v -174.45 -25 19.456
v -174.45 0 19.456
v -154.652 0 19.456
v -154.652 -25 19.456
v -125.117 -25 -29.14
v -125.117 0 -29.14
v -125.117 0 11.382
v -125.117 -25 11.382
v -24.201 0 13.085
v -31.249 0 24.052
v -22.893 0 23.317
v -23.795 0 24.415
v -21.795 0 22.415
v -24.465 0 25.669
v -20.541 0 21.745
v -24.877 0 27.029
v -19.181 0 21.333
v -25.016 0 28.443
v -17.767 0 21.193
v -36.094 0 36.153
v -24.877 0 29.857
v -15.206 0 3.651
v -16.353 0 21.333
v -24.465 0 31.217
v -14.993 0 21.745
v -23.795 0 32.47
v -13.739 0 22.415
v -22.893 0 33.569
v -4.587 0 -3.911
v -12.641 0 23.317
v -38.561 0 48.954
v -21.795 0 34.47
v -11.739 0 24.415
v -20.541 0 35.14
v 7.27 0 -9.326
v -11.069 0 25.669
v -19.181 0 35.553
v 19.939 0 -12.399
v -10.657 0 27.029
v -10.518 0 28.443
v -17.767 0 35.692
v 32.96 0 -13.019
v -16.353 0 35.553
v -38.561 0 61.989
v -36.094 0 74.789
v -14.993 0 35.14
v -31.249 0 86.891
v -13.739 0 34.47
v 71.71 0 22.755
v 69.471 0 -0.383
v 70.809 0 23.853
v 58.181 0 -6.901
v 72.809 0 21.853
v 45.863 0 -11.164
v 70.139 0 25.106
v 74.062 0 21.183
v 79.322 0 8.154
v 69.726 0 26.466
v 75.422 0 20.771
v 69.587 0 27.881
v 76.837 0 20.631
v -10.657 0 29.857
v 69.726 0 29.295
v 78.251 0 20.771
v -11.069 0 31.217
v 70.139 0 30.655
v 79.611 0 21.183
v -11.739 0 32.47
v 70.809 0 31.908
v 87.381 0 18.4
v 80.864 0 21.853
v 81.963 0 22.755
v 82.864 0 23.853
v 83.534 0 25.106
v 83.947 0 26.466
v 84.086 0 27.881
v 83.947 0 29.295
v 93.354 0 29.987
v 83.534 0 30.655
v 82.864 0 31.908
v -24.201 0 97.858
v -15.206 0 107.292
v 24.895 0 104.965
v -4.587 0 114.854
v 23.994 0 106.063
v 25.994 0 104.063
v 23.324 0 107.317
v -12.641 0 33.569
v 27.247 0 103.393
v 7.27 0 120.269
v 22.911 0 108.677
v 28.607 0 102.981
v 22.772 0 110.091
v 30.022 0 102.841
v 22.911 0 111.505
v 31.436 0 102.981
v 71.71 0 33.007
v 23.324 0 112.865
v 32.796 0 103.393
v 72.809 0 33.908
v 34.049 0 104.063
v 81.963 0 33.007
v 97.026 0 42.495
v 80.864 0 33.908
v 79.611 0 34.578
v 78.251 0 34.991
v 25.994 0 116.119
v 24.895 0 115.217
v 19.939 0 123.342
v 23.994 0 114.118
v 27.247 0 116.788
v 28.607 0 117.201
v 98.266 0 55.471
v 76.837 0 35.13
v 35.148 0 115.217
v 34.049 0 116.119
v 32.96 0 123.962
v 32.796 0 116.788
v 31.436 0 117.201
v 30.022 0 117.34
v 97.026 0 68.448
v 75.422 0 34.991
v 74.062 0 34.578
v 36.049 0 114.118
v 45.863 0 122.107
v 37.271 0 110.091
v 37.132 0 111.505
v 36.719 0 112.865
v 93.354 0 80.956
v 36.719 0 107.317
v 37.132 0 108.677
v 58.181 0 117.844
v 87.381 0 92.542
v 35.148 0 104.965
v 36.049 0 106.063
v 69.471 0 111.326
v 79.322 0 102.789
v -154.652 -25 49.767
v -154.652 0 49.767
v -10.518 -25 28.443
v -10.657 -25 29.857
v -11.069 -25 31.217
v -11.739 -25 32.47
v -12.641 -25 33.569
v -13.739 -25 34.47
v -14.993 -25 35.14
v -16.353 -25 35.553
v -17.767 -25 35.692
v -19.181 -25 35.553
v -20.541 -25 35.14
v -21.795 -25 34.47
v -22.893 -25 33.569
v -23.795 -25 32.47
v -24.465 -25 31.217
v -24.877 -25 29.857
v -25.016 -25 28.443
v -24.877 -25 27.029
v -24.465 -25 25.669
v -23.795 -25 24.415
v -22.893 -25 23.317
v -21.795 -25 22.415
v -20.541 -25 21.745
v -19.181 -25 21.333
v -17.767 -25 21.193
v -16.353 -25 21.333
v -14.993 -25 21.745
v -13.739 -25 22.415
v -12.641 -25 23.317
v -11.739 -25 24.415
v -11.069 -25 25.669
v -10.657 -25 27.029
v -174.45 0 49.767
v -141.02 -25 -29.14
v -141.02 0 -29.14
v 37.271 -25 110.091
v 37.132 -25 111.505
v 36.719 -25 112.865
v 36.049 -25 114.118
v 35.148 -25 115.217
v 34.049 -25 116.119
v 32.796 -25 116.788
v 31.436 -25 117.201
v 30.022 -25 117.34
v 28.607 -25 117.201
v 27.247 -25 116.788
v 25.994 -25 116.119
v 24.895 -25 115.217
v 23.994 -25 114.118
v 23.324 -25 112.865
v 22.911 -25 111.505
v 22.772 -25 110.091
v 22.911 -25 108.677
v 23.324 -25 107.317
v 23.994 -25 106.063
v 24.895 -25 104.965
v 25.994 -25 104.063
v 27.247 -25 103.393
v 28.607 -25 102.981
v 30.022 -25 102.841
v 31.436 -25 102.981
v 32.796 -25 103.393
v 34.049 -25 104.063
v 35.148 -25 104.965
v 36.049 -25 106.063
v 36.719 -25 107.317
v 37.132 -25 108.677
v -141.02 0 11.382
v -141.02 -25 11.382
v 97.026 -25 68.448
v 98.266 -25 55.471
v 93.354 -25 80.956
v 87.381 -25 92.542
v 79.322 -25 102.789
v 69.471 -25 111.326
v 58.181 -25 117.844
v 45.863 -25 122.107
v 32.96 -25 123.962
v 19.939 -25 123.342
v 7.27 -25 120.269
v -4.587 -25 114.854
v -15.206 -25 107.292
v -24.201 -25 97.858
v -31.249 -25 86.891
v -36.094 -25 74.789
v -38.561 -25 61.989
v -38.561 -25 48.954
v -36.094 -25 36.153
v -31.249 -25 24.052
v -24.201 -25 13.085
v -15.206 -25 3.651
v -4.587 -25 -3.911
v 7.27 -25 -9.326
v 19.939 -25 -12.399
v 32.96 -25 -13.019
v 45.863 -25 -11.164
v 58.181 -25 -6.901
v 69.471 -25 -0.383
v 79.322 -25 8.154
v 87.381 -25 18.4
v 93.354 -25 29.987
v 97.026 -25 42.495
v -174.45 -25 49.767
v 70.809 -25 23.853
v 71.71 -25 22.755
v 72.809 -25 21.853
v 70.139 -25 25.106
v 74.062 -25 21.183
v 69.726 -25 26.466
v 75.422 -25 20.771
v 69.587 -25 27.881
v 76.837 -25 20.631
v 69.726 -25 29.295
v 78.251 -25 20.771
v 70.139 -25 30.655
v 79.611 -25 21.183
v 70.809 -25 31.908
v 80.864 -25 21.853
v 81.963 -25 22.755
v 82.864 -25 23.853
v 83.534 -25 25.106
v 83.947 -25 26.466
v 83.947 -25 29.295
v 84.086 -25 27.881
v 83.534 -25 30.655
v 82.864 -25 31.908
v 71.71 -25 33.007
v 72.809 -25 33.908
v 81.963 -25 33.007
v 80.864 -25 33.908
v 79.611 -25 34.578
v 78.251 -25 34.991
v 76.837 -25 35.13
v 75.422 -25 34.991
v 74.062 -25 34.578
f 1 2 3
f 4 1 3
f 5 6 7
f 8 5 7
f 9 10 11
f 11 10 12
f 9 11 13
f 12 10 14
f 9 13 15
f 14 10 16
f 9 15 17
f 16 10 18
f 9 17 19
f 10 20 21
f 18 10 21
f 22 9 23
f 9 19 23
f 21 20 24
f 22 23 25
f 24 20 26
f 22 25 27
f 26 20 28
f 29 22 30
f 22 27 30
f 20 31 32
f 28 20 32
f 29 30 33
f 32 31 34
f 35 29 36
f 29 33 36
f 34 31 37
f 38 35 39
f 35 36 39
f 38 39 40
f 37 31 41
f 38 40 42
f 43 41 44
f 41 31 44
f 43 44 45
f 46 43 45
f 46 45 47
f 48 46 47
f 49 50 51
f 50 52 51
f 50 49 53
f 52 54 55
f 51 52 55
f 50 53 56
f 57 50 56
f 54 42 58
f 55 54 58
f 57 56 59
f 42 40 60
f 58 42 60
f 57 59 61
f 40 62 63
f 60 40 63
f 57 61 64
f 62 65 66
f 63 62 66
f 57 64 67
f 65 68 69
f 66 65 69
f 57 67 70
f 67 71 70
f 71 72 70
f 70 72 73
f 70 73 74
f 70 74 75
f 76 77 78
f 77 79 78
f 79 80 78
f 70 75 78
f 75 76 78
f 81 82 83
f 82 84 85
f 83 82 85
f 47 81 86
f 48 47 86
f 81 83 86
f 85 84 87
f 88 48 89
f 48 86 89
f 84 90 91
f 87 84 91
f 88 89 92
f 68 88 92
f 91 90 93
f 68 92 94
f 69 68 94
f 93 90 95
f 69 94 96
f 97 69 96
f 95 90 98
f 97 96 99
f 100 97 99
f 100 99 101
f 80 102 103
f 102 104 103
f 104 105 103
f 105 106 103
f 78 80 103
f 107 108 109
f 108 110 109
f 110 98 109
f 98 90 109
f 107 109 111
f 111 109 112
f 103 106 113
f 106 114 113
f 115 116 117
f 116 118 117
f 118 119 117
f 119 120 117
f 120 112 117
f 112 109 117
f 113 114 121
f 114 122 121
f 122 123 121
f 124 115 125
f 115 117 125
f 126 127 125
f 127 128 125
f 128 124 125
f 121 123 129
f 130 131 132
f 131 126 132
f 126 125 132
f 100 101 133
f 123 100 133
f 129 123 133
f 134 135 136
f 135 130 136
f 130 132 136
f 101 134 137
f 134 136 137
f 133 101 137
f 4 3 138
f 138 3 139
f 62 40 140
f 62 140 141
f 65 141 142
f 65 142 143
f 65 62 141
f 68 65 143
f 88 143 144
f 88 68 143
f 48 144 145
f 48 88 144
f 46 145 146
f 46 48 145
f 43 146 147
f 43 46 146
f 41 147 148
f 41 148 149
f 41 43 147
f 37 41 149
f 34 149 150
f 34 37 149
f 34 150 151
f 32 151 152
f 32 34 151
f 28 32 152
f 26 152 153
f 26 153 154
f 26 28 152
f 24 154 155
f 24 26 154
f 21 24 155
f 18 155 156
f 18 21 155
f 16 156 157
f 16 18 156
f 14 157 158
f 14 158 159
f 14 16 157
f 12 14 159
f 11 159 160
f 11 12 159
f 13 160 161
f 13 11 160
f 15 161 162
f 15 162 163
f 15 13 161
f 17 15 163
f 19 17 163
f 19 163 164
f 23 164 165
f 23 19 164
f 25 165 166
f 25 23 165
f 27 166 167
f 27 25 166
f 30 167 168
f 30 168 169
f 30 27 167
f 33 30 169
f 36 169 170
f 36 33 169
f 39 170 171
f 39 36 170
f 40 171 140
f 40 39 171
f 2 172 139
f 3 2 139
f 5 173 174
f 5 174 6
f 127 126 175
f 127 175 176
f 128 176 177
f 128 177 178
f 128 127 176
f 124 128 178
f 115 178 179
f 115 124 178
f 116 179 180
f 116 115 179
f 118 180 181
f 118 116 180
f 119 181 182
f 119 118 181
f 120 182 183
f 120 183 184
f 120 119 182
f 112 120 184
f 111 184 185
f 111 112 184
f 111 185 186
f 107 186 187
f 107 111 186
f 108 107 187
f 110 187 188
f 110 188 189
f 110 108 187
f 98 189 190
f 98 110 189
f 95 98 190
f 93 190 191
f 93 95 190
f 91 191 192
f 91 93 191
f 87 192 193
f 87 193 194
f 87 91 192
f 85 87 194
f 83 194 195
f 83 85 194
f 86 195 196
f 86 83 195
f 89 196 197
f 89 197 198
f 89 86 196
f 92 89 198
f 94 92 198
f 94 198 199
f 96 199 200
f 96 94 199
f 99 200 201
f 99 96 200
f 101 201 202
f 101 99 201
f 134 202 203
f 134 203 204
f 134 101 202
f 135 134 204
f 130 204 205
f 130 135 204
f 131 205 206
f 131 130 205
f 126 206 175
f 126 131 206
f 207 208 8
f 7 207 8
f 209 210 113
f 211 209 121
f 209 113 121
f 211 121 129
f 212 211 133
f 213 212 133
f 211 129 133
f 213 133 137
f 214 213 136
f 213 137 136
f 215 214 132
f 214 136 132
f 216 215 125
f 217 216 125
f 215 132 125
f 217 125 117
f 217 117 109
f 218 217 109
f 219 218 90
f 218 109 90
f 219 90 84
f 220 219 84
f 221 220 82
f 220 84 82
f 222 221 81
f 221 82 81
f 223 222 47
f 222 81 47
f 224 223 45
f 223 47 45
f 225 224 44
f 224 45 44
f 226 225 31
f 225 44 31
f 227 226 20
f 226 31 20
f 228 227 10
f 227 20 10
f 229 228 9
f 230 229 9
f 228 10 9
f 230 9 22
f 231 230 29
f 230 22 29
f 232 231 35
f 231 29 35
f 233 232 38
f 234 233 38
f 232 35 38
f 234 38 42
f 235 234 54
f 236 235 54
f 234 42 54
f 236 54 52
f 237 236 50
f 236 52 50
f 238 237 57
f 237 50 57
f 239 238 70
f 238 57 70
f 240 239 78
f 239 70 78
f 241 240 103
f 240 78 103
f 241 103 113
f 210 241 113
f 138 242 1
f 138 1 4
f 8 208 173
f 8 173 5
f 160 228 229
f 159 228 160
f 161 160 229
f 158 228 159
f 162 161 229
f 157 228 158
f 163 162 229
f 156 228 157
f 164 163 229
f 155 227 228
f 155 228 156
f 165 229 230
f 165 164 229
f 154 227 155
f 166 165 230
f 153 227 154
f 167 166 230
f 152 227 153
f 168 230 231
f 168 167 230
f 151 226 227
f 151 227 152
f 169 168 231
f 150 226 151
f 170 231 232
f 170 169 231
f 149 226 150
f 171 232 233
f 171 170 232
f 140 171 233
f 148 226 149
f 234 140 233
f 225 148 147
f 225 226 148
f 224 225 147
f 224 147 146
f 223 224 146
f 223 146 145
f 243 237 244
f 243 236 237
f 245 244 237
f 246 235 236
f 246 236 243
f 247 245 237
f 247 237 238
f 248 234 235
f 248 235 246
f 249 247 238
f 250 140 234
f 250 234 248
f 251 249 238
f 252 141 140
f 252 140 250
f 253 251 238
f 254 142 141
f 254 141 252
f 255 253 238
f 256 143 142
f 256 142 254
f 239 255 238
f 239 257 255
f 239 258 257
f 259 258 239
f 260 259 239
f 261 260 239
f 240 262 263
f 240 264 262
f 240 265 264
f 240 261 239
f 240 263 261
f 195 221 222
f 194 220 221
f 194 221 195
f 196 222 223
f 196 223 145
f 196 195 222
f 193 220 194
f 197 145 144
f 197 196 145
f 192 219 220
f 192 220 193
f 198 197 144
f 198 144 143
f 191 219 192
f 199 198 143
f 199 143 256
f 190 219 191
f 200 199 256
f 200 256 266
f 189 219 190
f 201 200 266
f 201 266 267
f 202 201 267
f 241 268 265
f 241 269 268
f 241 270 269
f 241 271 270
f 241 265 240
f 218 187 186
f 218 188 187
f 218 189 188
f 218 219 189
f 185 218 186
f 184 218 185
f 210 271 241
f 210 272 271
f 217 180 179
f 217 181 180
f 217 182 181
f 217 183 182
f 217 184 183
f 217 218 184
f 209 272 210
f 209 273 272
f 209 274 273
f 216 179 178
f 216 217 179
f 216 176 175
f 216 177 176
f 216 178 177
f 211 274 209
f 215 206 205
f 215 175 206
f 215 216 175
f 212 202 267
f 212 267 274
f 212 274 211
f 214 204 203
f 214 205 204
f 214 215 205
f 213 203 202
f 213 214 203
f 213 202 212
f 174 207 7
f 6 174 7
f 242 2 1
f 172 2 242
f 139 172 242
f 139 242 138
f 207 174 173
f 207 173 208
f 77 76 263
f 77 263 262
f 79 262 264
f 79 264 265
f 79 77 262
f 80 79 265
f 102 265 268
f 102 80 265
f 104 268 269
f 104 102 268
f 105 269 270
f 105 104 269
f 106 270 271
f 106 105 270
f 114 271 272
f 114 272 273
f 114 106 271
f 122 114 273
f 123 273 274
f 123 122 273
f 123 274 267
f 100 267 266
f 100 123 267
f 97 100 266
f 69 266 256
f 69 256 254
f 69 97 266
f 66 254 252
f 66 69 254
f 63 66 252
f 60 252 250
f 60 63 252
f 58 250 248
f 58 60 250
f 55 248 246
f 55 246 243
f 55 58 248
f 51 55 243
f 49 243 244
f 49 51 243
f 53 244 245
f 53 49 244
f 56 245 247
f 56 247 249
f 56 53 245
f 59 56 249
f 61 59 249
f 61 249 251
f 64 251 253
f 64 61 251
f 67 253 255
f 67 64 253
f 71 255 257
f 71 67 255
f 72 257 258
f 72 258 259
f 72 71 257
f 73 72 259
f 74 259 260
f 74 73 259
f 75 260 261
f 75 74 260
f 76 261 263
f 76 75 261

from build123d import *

# Parameters (mm, degrees)
F0_W     = 19.798026
F0_H     = 30.310742
F0_W_2   = 15.903339
F0_H_2   = 40.522663
F1_DEPTH = 25
F2_R     = 68.568566
F2_R_2   = 7.249438
F3_DEPTH = 25


with BuildPart() as f1:
    # F0 (on Front) → F1 (new body)
    with BuildSketch(Plane.XZ):
        with Locations((-164.550908, 34.611419)):
            Rectangle(F0_W, F0_H)
        with Locations((-133.068777, -8.87887)):
            Rectangle(F0_W_2, F0_H_2)
    extrude(amount=F1_DEPTH)


with BuildPart() as f3:
    # F2 (on Front) → F3 (new body)
    with BuildSketch(Plane.XZ):
        with Locations((29.697057, 55.471439)):
            Circle(F2_R)
        with Locations((-17.76704, 28.442796)):
            Circle(F2_R_2, mode=Mode.SUBTRACT)
        with Locations((76.836597, 27.880647)):
            Circle(F2_R_2, mode=Mode.SUBTRACT)
        with Locations((30.021613, 110.090874)):
            Circle(F2_R_2, mode=Mode.SUBTRACT)
    extrude(amount=F3_DEPTH)


solid = Compound([f1.part, f3.part])
